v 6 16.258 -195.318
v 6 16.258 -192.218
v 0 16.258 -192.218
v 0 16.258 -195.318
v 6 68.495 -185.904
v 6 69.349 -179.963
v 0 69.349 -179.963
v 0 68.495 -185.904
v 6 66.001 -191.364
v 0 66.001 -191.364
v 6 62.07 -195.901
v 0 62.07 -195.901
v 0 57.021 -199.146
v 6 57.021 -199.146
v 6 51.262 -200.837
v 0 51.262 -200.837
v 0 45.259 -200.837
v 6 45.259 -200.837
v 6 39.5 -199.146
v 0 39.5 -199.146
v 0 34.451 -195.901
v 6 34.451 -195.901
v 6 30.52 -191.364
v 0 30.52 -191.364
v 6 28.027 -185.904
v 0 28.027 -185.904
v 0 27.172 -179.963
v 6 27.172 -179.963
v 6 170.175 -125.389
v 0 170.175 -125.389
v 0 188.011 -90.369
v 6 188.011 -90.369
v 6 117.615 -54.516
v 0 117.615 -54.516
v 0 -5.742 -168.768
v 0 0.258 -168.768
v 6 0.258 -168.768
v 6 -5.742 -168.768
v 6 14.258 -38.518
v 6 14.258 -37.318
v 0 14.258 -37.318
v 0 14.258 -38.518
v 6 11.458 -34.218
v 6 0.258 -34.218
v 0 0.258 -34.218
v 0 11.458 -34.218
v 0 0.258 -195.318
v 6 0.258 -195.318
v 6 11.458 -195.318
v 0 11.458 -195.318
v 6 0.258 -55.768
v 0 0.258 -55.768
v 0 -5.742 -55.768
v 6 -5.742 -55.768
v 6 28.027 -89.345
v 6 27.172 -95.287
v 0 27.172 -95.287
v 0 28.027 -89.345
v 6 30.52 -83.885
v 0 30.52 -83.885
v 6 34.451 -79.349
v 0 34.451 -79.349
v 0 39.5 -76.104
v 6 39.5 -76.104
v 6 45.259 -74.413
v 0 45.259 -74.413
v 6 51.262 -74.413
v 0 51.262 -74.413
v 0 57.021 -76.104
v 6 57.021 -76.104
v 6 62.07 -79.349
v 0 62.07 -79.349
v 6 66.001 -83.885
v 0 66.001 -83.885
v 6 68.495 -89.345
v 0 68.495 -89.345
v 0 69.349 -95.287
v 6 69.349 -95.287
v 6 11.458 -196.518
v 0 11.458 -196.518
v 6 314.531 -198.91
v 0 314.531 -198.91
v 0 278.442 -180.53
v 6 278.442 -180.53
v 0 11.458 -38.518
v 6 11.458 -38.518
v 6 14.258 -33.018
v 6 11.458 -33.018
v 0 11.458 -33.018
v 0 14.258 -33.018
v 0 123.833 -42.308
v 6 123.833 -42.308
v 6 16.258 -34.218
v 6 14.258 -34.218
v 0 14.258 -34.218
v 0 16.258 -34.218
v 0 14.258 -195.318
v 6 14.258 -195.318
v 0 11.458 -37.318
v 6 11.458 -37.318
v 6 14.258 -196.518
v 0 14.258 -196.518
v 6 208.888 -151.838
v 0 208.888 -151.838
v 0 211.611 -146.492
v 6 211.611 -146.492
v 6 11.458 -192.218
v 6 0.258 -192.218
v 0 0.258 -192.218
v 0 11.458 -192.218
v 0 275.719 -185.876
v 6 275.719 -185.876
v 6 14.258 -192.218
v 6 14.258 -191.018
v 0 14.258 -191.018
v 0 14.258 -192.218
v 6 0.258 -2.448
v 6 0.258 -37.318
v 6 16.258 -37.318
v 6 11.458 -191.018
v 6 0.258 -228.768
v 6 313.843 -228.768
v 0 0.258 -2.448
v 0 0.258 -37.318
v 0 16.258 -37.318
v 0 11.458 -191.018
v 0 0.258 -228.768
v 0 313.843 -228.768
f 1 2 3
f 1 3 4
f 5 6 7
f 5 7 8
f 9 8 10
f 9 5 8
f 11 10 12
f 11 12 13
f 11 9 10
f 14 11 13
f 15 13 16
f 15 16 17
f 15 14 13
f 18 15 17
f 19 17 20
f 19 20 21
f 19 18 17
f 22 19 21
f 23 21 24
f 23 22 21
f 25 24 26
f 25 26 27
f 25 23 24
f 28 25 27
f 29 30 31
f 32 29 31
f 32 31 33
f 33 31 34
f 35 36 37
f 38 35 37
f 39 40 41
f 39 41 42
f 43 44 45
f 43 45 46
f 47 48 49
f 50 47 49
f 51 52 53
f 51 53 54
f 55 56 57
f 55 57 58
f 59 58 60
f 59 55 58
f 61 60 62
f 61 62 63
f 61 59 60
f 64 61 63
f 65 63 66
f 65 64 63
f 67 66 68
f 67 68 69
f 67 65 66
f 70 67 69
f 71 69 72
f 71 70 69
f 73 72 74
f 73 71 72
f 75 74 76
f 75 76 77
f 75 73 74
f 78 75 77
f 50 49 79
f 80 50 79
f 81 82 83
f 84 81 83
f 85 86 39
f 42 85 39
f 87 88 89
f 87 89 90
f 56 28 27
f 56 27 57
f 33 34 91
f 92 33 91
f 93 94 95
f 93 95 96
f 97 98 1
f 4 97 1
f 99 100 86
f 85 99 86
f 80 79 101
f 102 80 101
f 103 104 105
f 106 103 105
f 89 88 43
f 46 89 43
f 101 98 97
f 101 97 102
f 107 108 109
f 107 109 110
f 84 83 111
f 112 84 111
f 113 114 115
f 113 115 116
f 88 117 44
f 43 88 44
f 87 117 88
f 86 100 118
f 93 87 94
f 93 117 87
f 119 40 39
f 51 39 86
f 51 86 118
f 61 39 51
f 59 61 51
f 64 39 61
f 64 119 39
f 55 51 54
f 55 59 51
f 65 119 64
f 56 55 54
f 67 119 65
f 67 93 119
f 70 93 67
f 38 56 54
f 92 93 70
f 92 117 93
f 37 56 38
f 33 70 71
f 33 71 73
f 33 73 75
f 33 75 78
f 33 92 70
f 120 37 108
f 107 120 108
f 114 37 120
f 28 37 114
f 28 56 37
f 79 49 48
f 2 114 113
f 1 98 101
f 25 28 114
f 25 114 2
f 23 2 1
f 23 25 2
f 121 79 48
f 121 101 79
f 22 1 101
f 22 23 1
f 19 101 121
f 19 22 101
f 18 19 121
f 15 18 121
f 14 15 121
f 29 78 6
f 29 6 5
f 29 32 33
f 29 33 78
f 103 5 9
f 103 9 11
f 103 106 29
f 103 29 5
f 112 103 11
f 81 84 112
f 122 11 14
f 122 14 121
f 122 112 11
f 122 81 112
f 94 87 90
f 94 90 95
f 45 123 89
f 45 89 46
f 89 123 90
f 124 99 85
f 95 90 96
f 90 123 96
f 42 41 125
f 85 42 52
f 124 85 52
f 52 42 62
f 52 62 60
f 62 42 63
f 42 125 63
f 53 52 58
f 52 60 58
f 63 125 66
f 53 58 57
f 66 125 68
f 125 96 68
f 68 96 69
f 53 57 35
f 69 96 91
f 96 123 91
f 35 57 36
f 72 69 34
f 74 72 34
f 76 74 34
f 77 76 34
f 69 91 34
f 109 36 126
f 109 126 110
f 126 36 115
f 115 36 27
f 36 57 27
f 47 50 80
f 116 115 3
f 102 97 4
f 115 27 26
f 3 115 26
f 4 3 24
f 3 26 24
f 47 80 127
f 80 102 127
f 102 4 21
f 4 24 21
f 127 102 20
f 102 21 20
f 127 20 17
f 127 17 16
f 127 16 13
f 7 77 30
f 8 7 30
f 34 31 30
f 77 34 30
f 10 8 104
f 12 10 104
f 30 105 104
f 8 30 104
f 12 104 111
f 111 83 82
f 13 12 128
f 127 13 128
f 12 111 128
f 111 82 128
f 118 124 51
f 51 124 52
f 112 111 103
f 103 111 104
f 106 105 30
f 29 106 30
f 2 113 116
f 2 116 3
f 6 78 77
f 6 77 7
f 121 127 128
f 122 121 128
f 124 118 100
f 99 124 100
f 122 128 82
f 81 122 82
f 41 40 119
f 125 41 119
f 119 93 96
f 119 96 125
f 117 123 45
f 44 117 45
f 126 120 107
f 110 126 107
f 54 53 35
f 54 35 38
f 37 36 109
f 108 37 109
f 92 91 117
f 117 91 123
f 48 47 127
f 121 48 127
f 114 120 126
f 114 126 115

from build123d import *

# Parameters (mm, degrees)
BOSS_EXTRUDE1_DEPTH = 6
CUT_EXTRUDE1_DEPTH  = 6
SKETCH3_W           = 6
SKETCH3_H           = 113
BOSS_EXTRUDE2_DEPTH = 6
SKETCH4_W           = 3.1
SKETCH4_H           = 16
CUT_EXTRUDE2_DEPTH  = 6
SKETCH5_W           = 5.5
SKETCH5_H           = 2.8
CUT_EXTRUDE3_DEPTH  = 6


with BuildPart() as part:
    # Sketch1 → Boss-Extrude1 (new body)
    with BuildSketch(Plane(origin=(0, 0, 0), x_dir=(0, 0, -1), z_dir=(1, 0, 0))):
        Polygon((42.307983077, 123.832979907), (2.448355916, 0.258483339), (228.768209888, 0.258483339), (228.768209888, 313.843147788), (198.909979532, 314.531209333), (180.529620903, 278.442257884), (185.876132229, 275.719241791), (151.838431063, 208.887850219), (146.491919737, 211.610866313), (125.388545015, 170.175403538), (90.368895831, 188.011158949), (54.515850604, 117.615426494), align=None)
    extrude(amount=BOSS_EXTRUDE1_DEPTH)

    # Sketch2 → Cut-Extrude1 (cut)
    with BuildSketch(Plane(origin=(6, 0, 0), x_dir=(0, 0, -1), z_dir=(1, 0, 0))):
        with BuildLine():
            Line((95.286629817, 69.348811068), (179.963244622, 69.348811068))
            ThreePointArc((179.963244622, 69.348811068), (201.051431087, 48.260624604), (179.963244622, 27.172438139))
            Line((179.963244622, 27.172438139), (95.286629817, 27.172438139))
            ThreePointArc((95.286629817, 27.172438139), (74.198443353, 48.260624604), (95.286629817, 69.348811068))
        make_face()
    extrude(amount=-CUT_EXTRUDE1_DEPTH, mode=Mode.SUBTRACT)

    # Sketch3 → Boss-Extrude2 (add)
    with BuildSketch(Plane.XZ.offset(-0.258483339)):
        with Locations((3, -112.268209888)):
            Rectangle(SKETCH3_W, SKETCH3_H)
    extrude(amount=BOSS_EXTRUDE2_DEPTH)

    # Sketch4 → Cut-Extrude2 (cut)
    with BuildSketch(Plane(origin=(6, 0, 0), x_dir=(0, 0, -1), z_dir=(1, 0, 0))):
        with Locations((35.768209888, 8.258483339)):
            Rectangle(SKETCH4_W, SKETCH4_H)
        with Locations((193.768209888, 8.258483339)):
            Rectangle(SKETCH4_W, SKETCH4_H)
    extrude(amount=-CUT_EXTRUDE2_DEPTH, mode=Mode.SUBTRACT)

    # Sketch5 → Cut-Extrude3 (cut)
    with BuildSketch(Plane(origin=(6, 0, 0), x_dir=(0, 0, -1), z_dir=(1, 0, 0))):
        with Locations((35.768209888, 12.858483339)):
            Rectangle(SKETCH5_W, SKETCH5_H)
        with Locations((193.768209888, 12.858483339)):
            Rectangle(SKETCH5_W, SKETCH5_H)
    extrude(amount=-CUT_EXTRUDE3_DEPTH, mode=Mode.SUBTRACT)


solid = part.part
